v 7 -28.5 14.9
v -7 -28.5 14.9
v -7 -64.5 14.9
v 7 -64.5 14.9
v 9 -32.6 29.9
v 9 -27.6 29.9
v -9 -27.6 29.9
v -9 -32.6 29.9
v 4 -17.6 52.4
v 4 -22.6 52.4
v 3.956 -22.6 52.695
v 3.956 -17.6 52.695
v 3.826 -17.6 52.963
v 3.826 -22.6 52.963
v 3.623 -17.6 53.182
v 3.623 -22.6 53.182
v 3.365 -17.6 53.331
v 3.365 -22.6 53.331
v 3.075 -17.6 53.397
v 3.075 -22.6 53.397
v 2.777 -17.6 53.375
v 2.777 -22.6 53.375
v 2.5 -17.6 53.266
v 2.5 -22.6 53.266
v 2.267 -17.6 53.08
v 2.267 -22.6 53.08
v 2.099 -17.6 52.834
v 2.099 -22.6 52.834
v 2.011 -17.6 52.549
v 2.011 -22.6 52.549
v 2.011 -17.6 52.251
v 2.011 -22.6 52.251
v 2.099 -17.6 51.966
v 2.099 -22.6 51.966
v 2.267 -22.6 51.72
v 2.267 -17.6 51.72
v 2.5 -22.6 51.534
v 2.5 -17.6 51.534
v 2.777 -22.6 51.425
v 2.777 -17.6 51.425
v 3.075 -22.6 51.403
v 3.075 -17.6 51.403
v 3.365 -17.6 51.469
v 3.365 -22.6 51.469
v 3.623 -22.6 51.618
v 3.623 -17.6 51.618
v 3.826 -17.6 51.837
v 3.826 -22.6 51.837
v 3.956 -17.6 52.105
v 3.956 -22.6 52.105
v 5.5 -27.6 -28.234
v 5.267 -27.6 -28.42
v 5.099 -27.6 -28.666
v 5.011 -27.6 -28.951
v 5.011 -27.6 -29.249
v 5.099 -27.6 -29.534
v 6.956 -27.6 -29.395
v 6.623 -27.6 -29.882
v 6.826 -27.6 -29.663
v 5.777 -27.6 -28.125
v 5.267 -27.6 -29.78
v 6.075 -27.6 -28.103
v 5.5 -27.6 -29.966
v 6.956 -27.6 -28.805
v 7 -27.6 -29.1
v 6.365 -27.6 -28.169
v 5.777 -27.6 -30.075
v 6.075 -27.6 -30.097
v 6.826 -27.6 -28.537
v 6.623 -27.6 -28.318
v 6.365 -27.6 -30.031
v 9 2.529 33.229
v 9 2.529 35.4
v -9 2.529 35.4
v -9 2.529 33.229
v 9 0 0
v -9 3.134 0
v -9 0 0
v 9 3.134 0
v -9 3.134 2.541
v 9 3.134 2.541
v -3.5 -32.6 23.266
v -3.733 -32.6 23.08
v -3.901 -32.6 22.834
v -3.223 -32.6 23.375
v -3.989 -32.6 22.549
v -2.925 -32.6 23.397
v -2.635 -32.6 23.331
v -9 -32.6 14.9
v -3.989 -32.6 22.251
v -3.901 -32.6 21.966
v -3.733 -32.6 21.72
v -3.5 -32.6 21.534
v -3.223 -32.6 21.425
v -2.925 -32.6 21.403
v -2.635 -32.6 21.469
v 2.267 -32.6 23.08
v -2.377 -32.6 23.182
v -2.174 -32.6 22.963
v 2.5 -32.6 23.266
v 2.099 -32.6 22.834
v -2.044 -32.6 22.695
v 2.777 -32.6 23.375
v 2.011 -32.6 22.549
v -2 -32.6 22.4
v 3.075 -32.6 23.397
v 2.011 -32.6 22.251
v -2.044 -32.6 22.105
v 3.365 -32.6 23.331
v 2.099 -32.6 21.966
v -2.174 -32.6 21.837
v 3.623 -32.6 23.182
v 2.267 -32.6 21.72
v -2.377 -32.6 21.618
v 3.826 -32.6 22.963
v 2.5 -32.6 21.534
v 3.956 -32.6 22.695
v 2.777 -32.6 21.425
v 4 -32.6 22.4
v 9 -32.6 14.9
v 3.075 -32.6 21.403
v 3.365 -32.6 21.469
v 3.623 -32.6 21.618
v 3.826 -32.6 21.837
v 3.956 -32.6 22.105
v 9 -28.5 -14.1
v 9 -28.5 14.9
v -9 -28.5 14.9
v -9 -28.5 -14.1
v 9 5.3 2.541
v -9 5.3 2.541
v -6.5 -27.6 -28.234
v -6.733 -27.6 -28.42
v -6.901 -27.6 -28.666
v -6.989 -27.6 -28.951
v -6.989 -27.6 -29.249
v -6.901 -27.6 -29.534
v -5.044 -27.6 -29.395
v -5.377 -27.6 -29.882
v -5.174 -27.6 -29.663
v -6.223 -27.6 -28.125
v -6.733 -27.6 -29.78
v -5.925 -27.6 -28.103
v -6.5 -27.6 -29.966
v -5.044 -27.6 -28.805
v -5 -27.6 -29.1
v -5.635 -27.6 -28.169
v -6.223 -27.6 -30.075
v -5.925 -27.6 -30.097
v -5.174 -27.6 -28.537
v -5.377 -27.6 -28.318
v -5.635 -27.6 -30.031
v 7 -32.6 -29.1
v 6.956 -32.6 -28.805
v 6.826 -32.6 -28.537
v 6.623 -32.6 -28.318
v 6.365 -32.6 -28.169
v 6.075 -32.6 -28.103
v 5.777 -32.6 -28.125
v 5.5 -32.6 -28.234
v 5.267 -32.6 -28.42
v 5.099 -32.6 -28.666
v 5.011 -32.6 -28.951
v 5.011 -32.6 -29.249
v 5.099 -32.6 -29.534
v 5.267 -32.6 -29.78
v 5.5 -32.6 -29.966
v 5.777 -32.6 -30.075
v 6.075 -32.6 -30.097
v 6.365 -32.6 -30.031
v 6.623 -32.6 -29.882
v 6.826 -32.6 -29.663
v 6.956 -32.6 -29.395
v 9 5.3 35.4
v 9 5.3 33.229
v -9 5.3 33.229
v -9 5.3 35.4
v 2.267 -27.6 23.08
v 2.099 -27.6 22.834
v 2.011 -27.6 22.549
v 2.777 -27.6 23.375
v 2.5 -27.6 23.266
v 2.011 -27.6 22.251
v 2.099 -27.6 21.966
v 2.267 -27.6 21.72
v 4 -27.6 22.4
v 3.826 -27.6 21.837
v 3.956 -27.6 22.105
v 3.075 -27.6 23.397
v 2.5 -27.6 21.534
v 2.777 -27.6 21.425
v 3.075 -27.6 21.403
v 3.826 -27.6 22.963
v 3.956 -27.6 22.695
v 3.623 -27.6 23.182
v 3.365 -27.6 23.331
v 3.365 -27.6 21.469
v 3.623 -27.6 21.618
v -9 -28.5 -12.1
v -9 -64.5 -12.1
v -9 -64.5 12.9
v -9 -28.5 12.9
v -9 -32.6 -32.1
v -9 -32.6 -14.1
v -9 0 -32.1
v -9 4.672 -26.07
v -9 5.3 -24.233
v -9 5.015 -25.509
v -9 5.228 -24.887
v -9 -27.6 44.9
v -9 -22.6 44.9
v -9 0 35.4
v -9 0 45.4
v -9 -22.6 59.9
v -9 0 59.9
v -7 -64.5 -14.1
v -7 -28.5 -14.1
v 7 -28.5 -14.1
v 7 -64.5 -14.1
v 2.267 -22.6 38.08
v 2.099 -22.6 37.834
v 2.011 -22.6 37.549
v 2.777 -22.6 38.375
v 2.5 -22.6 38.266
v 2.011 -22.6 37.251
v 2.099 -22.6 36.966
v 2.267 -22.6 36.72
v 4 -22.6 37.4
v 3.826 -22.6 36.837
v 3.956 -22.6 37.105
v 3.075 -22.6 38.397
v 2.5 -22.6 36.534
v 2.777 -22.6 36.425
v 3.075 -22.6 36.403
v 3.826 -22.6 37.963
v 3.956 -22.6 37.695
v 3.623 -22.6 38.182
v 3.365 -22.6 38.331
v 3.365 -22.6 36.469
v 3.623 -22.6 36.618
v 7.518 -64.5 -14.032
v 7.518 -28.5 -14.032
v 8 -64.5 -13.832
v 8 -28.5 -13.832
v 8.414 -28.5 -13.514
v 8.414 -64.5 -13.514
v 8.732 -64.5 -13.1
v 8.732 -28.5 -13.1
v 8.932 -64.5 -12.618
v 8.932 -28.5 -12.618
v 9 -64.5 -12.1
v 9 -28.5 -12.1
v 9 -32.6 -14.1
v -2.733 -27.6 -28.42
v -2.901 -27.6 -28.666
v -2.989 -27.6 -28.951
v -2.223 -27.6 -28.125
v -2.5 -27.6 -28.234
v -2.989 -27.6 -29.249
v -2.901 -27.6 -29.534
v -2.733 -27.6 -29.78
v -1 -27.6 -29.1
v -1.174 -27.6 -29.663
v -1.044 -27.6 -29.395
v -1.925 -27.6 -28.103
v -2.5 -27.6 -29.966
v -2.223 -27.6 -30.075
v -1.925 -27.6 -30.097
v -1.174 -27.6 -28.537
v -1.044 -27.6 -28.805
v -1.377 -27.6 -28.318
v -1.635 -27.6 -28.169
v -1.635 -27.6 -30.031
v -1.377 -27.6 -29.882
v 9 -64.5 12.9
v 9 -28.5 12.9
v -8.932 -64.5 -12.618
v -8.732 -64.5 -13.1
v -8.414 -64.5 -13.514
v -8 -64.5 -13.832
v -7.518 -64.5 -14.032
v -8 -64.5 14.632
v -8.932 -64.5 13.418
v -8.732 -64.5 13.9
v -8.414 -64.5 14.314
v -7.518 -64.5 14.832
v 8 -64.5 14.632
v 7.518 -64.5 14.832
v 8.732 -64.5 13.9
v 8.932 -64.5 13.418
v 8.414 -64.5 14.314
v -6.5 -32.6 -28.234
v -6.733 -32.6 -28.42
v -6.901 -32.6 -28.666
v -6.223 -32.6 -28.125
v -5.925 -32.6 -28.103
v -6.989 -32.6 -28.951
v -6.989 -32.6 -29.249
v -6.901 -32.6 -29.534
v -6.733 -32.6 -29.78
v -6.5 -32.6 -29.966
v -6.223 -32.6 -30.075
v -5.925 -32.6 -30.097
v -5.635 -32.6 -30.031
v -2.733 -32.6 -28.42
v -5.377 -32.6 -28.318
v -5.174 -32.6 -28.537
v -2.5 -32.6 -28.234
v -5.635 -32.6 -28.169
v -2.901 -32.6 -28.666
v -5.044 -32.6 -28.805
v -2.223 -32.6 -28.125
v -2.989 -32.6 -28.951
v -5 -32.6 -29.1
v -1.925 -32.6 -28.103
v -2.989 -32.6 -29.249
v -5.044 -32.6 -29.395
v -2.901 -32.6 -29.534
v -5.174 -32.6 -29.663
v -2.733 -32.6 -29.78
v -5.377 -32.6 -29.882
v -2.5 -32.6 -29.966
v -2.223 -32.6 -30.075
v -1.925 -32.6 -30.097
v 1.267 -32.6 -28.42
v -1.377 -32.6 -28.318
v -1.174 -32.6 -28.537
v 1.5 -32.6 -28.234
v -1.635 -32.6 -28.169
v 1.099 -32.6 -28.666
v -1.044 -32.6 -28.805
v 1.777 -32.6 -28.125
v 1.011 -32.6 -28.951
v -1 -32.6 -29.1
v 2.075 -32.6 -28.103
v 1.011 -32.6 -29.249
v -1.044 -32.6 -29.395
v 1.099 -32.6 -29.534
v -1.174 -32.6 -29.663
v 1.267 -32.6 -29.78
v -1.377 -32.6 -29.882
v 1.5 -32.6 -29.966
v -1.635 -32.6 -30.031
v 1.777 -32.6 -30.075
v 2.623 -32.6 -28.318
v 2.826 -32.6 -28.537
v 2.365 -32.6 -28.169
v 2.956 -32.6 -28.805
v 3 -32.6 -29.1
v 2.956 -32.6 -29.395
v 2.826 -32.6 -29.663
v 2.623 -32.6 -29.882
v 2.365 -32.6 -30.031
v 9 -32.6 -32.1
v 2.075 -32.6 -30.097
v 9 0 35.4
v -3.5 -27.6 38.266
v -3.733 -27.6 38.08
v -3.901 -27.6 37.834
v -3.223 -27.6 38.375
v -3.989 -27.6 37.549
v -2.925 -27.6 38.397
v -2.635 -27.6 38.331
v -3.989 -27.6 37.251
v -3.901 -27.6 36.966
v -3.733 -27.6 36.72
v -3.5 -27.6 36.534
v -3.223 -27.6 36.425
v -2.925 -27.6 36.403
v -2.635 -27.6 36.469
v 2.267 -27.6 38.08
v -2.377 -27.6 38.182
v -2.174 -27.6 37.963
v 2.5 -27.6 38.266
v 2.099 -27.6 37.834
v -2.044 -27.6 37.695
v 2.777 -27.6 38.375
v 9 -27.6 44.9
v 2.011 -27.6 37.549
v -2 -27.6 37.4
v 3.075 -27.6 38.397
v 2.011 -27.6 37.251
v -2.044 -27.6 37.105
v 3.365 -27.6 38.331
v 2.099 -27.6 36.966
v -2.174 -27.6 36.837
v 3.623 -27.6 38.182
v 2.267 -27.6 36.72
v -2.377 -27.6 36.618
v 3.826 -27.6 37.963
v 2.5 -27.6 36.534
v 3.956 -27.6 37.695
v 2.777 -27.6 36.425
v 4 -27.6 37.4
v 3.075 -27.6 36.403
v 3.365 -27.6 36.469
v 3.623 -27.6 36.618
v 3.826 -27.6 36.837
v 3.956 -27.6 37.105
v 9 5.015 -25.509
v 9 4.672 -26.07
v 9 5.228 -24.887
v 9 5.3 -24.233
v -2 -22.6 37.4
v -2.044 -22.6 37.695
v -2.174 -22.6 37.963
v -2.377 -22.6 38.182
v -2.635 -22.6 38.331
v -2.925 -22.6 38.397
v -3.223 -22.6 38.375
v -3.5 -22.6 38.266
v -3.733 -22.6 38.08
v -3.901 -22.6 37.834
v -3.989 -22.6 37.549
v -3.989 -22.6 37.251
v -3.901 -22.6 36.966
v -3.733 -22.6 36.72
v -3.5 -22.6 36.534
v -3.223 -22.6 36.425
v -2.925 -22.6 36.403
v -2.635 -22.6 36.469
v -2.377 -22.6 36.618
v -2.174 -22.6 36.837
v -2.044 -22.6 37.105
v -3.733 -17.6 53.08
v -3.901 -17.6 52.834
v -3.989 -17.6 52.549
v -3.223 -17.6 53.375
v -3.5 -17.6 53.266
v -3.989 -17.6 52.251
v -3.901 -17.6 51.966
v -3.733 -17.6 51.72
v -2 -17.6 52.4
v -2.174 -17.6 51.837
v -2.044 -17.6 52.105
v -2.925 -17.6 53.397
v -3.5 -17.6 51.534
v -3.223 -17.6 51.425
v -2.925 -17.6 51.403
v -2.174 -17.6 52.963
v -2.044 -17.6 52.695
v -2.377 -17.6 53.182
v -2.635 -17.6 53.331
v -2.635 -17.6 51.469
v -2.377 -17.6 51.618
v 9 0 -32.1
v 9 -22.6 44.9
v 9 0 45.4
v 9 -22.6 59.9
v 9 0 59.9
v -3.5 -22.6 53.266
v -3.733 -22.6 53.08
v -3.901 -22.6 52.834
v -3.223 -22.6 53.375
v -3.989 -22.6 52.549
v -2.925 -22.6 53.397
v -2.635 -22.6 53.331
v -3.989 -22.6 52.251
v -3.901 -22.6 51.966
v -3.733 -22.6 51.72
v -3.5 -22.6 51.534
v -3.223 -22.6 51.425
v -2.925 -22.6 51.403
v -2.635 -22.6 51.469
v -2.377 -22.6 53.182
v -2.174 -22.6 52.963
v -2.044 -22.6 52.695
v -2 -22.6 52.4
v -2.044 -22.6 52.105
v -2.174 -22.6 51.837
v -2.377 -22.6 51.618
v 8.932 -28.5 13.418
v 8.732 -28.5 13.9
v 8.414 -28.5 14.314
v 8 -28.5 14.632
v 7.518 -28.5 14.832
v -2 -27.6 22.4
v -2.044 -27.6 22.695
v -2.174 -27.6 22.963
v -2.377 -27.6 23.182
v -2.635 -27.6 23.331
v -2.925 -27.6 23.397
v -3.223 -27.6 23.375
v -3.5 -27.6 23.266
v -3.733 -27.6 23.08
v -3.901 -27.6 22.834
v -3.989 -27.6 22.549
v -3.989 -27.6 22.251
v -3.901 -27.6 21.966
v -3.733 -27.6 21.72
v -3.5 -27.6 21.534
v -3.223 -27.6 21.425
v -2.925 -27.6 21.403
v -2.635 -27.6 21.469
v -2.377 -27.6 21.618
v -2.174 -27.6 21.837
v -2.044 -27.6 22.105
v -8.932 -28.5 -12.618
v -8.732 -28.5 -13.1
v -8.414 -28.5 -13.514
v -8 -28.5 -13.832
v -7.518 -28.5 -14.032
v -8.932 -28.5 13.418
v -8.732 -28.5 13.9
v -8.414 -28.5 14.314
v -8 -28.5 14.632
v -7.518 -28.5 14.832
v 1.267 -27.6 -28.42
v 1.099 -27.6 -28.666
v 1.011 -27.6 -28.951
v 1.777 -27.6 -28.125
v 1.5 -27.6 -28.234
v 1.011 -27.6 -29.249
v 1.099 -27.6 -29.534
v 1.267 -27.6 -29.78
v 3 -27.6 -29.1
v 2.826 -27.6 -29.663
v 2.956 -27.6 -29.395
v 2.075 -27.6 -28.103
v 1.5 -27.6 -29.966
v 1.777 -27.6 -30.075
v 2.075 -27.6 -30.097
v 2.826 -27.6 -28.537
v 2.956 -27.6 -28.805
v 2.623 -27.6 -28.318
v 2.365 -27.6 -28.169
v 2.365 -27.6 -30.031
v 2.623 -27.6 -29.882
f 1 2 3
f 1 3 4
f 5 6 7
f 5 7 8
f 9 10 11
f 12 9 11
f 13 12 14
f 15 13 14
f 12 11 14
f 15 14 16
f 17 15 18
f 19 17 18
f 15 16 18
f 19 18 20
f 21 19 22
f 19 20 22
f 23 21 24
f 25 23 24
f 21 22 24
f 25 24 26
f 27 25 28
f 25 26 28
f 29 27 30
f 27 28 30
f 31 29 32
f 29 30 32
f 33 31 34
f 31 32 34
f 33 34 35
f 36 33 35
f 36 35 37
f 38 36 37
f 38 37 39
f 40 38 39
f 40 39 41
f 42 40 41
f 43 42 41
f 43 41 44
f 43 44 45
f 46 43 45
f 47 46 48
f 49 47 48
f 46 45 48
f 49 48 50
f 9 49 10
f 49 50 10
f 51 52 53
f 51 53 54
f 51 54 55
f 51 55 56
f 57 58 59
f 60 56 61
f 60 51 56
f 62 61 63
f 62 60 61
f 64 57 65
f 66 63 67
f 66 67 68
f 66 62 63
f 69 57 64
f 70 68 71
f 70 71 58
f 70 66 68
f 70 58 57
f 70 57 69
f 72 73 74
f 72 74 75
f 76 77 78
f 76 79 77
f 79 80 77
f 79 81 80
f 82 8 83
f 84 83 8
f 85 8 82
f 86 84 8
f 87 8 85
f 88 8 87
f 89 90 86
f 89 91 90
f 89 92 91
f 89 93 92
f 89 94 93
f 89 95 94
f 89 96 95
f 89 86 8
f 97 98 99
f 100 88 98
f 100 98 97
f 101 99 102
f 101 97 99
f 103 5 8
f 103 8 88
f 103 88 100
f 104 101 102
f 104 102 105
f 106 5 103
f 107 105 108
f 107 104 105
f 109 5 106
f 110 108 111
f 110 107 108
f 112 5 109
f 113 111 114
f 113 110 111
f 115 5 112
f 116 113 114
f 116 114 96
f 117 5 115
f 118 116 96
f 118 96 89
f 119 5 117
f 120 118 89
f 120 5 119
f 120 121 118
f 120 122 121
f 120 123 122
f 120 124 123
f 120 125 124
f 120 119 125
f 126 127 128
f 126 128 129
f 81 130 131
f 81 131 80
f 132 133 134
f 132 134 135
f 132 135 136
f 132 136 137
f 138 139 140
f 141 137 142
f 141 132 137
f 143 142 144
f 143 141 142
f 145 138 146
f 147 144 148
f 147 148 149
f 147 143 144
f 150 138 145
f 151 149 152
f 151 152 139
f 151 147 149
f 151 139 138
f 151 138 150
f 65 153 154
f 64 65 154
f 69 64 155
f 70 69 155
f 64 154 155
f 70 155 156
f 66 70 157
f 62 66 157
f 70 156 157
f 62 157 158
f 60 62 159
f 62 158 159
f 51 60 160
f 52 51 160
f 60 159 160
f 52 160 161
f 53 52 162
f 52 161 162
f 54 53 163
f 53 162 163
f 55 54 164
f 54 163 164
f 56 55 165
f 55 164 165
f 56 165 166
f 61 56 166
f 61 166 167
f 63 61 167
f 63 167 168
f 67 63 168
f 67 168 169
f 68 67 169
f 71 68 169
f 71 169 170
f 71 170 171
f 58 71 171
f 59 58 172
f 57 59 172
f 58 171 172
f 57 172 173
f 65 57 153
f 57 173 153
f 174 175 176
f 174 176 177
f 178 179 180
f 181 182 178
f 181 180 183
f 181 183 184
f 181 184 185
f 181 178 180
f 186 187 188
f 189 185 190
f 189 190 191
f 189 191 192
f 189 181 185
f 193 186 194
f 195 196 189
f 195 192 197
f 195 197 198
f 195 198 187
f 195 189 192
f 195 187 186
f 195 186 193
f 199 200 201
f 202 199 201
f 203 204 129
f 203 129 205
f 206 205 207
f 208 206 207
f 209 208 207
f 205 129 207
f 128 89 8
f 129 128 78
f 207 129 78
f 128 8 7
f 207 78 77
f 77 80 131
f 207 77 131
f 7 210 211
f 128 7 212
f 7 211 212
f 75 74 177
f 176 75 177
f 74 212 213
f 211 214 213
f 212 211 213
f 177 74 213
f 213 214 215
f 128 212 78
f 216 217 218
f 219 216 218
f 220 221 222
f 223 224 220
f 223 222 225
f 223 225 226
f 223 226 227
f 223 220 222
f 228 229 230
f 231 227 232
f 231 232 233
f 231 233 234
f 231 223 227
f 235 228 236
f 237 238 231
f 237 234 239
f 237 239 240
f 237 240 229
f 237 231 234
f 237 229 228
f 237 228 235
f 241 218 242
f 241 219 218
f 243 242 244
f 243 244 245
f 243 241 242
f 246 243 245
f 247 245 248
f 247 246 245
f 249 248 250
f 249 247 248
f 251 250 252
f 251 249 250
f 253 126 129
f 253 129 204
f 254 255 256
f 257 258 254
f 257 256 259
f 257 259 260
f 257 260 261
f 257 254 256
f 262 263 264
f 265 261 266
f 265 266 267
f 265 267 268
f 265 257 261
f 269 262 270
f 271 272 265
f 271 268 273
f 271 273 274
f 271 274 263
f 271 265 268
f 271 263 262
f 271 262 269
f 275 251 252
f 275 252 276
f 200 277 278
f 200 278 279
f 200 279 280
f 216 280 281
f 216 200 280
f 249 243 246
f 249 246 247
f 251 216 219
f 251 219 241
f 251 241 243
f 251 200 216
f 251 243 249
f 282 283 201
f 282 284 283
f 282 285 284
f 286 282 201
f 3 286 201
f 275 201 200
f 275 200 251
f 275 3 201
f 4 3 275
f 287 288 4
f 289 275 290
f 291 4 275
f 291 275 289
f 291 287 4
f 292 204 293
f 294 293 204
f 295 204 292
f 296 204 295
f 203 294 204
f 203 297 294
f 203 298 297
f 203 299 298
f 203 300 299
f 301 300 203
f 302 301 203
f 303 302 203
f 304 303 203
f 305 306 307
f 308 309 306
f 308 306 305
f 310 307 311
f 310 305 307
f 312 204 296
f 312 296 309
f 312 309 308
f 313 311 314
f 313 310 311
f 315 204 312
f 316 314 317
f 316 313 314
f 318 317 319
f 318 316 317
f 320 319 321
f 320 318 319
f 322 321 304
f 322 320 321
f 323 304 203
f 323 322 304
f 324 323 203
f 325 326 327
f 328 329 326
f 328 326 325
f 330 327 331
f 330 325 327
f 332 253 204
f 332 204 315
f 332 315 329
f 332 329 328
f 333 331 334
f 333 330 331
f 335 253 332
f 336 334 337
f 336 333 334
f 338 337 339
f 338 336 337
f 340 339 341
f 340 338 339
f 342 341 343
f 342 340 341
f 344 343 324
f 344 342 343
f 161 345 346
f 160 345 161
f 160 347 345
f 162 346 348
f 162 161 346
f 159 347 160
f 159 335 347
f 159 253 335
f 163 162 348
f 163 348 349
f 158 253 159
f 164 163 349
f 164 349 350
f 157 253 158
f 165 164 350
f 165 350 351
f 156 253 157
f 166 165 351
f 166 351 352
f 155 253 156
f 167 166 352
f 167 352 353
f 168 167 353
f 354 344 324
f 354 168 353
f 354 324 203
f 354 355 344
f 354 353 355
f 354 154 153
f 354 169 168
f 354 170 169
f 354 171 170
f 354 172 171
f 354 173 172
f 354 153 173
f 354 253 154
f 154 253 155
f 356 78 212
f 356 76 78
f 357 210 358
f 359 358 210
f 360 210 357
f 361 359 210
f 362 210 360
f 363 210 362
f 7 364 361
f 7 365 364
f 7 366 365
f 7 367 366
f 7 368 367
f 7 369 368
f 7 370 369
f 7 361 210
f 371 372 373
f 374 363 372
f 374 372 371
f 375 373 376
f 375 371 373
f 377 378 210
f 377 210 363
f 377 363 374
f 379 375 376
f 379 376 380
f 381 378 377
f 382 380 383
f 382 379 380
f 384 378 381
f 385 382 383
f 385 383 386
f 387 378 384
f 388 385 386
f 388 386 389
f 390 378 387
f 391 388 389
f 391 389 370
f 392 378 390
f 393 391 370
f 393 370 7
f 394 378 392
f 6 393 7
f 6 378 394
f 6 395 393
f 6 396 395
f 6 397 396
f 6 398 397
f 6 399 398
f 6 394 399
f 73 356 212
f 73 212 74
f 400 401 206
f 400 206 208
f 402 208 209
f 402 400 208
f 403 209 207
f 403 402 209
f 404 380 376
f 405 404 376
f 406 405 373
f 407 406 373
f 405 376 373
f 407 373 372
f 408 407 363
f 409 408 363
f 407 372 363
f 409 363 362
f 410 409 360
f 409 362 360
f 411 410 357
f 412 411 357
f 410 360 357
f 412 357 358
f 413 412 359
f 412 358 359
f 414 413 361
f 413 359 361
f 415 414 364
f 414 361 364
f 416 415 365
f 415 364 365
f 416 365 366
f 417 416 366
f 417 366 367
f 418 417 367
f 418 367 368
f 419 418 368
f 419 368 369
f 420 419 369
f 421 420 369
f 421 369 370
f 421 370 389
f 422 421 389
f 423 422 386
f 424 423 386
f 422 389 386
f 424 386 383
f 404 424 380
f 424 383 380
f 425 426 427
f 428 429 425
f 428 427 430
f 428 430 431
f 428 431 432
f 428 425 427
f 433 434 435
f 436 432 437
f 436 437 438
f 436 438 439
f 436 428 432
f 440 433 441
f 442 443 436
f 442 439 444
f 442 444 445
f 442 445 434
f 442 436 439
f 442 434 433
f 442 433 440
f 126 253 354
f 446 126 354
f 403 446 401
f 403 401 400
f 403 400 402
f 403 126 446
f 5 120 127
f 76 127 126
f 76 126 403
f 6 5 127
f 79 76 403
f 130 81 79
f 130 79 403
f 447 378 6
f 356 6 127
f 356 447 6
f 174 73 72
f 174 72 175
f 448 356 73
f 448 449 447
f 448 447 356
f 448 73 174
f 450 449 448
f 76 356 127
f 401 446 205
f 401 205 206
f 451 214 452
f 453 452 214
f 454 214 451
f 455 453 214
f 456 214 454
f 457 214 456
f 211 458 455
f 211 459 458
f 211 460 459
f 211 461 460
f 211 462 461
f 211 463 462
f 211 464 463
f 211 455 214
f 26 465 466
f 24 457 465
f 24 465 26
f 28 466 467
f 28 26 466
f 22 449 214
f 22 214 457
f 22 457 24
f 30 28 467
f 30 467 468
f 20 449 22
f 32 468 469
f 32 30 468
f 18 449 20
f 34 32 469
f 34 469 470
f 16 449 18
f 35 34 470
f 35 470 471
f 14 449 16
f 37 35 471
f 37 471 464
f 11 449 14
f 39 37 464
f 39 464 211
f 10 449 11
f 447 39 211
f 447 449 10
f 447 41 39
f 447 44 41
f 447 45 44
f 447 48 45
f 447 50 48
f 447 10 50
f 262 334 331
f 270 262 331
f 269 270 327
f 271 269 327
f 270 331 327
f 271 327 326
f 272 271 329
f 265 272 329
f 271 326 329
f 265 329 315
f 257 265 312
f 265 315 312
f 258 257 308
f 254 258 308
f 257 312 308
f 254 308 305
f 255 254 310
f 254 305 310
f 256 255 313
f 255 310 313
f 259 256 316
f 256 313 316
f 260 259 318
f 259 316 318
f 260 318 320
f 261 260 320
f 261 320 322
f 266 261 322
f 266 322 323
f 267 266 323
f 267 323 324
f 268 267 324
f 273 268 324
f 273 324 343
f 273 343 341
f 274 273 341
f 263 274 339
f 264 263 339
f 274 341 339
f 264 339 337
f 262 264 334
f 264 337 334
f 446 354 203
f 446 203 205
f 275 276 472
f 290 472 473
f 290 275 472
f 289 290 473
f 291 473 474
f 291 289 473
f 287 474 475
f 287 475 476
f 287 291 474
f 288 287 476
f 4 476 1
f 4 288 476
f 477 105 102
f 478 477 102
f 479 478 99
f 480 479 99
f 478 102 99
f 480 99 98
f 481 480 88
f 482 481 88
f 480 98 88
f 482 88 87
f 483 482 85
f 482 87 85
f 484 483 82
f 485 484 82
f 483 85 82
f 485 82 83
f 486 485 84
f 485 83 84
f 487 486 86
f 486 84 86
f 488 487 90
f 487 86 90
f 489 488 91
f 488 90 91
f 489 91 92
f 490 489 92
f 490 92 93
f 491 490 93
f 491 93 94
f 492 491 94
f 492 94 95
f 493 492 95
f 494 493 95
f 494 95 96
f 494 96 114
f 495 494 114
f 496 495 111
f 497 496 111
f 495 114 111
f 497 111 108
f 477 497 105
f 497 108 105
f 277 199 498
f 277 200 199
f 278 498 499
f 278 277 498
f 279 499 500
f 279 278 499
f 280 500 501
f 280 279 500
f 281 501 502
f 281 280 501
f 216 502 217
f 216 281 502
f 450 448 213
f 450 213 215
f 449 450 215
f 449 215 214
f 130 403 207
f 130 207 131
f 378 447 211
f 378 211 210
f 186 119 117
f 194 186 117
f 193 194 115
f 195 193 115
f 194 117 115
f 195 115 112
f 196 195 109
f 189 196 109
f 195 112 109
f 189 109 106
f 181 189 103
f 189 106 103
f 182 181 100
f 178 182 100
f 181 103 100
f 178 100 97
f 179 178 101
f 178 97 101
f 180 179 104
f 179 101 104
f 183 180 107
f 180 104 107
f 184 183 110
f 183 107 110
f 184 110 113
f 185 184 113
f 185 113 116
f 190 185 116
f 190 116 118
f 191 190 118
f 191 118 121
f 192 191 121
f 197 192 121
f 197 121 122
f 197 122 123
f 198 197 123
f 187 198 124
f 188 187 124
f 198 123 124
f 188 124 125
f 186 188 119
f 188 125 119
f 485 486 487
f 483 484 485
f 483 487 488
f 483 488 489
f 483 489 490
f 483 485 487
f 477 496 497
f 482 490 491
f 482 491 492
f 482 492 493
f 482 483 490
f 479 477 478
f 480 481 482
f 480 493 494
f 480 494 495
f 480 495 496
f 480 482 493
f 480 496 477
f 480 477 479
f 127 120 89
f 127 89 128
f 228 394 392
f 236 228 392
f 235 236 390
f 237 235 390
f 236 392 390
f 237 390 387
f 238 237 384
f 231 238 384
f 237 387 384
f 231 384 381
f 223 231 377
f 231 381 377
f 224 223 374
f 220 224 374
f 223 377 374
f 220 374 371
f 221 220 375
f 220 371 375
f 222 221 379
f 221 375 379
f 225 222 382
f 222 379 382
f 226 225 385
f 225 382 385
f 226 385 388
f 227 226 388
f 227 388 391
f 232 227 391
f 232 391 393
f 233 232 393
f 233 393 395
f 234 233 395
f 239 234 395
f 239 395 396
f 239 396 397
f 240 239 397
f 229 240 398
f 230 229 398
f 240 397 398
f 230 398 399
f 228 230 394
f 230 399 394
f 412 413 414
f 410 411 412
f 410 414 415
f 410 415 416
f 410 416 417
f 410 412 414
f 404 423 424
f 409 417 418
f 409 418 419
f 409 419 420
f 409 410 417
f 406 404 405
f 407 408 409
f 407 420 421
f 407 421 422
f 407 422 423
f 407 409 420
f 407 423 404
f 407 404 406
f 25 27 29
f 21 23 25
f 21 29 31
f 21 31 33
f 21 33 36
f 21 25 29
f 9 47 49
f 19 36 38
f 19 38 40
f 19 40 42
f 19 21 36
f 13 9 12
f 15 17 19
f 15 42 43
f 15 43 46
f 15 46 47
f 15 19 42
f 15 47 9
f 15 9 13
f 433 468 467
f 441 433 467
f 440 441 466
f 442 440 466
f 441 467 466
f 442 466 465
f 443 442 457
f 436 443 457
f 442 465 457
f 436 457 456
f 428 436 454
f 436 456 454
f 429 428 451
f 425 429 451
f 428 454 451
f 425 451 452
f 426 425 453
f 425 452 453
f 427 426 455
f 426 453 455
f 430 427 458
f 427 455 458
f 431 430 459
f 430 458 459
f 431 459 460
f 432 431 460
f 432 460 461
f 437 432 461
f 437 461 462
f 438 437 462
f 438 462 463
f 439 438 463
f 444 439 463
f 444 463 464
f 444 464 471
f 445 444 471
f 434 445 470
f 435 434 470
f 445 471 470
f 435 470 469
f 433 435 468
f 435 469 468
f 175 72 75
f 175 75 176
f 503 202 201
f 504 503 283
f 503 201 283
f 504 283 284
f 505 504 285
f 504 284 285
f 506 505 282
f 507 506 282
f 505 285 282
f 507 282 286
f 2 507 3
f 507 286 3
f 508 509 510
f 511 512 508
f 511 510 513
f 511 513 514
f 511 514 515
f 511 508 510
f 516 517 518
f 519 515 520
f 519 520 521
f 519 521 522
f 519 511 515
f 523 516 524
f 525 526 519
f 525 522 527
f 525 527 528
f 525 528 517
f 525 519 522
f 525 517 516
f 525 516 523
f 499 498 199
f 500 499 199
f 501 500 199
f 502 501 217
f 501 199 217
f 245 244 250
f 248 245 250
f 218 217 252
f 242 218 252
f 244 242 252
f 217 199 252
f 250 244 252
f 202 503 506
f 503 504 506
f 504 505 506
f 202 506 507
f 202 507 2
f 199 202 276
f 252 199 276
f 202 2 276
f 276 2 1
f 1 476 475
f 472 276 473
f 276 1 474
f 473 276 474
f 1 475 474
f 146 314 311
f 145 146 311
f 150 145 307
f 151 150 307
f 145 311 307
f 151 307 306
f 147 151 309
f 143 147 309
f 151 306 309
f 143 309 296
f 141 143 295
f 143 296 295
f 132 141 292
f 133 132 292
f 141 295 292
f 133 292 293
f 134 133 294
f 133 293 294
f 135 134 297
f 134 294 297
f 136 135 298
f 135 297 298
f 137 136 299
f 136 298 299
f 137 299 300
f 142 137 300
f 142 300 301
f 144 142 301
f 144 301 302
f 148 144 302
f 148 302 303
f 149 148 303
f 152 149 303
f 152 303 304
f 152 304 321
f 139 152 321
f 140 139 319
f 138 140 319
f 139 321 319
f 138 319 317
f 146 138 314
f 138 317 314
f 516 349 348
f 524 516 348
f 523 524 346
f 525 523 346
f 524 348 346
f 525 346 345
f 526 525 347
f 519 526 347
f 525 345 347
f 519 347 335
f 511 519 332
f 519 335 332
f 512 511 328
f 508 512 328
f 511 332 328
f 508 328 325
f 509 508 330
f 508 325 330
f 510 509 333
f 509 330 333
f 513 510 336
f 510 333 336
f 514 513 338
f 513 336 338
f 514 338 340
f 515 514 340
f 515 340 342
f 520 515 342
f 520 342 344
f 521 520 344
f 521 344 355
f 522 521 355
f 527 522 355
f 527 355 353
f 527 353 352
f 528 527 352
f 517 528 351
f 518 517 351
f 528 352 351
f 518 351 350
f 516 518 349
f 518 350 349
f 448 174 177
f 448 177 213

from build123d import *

# Parameters (mm, degrees)
F1_DEPTH  = 9
F2_R      = 1
F3_DEPTH  = 5
F4_R      = 1
F5_DEPTH  = 5
F6_R      = 1
F7_DEPTH  = 5
F8_R      = 1
F9_DEPTH  = 5
F10_W     = 18
F10_H     = 29
F11_DEPTH = 36
F12_R     = 2


with BuildPart() as f1:
    # F0 (on Right) → F1 (new body, symmetric)
    with BuildSketch(Plane.YZ):
        with BuildLine():
            Line((0, 0), (0, 35.4))
            Line((0, 35.4), (2.5290442254, 35.4))
            Line((2.5290442254, 35.4), (2.5290442254, 33.2293925524))
            Line((2.5290442254, 33.2293925524), (5.3, 33.2293925524))
            Line((5.3, 33.2293925524), (5.3, 35.4))
            Line((5.3, 35.4), (0, 45.4))
            Line((0, 45.4), (0, 59.9))
            Line((0, 59.9), (-22.6, 59.9))
            Line((-22.6, 59.9), (-22.6, 44.9))
            Line((-22.6, 44.9), (-27.6, 44.9))
            Line((-27.6, 44.9), (-27.6, 29.9))
            Line((-27.6, 29.9), (-32.6, 29.9))
            Line((-32.6, 29.9), (-32.6, 14.9))
            Line((-32.6, 14.9), (-28.5, 14.9))
            Line((-28.5, 14.9), (-28.5, -14.1))
            Line((-28.5, -14.1), (-32.6, -14.1))
            Line((-32.6, -14.1), (-32.6, -32.1))
            Line((-32.6, -32.1), (0, -32.1))
            Line((0, -32.1), (4.6715575988, -26.0700664431))
            ThreePointArc((4.6715575988, -26.0700664431), (5.1385447677, -25.2036633164), (5.3, -24.2327546689))
            Line((5.3, -24.2327546689), (5.3, 0))
            Line((5.3, 0), (5.3, 2.5407448411))
            Line((5.3, 2.5407448411), (3.1340913847, 2.5407448411))
            Line((3.1340913847, 2.5407448411), (3.1340913847, 0))
            Line((3.1340913847, 0), (0, 0))
        make_face()
    extrude(amount=F1_DEPTH, both=True)

    # F2 (on face) → F3 (cut)
    with BuildSketch(Plane.XZ.offset(22.6)):
        with Locations((-3, 52.4)):
            Circle(F2_R)
        with Locations((3, 52.4)):
            Circle(F2_R)
    extrude(amount=-F3_DEPTH, mode=Mode.SUBTRACT)

    # F4 (on face) → F5 (cut)
    with BuildSketch(Plane.XZ.offset(27.6)):
        with Locations((-3, 37.4)):
            Circle(F4_R)
        with Locations((3, 37.4)):
            Circle(F4_R)
    extrude(amount=-F5_DEPTH, mode=Mode.SUBTRACT)

    # F6 (on face) → F7 (cut)
    with BuildSketch(Plane.XZ.offset(32.6)):
        with Locations((-3, 22.4)):
            Circle(F6_R)
        with Locations((3, 22.4)):
            Circle(F6_R)
    extrude(amount=-F7_DEPTH, mode=Mode.SUBTRACT)

    # F8 (on face) → F9 (cut)
    with BuildSketch(Plane.XZ.offset(32.6)):
        with Locations((-6, -29.1)):
            Circle(F8_R)
        with Locations((-2, -29.1)):
            Circle(F8_R)
        with Locations((2, -29.1)):
            Circle(F8_R)
        with Locations((6, -29.1)):
            Circle(F8_R)
    extrude(amount=-F9_DEPTH, mode=Mode.SUBTRACT)


with BuildPart() as f11:
    # F10 (on face) → F11 (new body)
    with BuildSketch(Plane.XZ.offset(28.5)):
        with Locations((0, 0.4)):
            Rectangle(F10_W, F10_H)
    extrude(amount=F11_DEPTH)

    # F12
    f12_edges = [f11.edges().sort_by_distance(p)[0] for p in [
        (9, -46.5, 14.9),
        (9, -46.5, -14.1),
        (-9, -46.5, -14.1),
        (-9, -46.5, 14.9),
    ]]
    fillet(f12_edges, radius=F12_R)


solid = Compound([f1.part, f11.part])
